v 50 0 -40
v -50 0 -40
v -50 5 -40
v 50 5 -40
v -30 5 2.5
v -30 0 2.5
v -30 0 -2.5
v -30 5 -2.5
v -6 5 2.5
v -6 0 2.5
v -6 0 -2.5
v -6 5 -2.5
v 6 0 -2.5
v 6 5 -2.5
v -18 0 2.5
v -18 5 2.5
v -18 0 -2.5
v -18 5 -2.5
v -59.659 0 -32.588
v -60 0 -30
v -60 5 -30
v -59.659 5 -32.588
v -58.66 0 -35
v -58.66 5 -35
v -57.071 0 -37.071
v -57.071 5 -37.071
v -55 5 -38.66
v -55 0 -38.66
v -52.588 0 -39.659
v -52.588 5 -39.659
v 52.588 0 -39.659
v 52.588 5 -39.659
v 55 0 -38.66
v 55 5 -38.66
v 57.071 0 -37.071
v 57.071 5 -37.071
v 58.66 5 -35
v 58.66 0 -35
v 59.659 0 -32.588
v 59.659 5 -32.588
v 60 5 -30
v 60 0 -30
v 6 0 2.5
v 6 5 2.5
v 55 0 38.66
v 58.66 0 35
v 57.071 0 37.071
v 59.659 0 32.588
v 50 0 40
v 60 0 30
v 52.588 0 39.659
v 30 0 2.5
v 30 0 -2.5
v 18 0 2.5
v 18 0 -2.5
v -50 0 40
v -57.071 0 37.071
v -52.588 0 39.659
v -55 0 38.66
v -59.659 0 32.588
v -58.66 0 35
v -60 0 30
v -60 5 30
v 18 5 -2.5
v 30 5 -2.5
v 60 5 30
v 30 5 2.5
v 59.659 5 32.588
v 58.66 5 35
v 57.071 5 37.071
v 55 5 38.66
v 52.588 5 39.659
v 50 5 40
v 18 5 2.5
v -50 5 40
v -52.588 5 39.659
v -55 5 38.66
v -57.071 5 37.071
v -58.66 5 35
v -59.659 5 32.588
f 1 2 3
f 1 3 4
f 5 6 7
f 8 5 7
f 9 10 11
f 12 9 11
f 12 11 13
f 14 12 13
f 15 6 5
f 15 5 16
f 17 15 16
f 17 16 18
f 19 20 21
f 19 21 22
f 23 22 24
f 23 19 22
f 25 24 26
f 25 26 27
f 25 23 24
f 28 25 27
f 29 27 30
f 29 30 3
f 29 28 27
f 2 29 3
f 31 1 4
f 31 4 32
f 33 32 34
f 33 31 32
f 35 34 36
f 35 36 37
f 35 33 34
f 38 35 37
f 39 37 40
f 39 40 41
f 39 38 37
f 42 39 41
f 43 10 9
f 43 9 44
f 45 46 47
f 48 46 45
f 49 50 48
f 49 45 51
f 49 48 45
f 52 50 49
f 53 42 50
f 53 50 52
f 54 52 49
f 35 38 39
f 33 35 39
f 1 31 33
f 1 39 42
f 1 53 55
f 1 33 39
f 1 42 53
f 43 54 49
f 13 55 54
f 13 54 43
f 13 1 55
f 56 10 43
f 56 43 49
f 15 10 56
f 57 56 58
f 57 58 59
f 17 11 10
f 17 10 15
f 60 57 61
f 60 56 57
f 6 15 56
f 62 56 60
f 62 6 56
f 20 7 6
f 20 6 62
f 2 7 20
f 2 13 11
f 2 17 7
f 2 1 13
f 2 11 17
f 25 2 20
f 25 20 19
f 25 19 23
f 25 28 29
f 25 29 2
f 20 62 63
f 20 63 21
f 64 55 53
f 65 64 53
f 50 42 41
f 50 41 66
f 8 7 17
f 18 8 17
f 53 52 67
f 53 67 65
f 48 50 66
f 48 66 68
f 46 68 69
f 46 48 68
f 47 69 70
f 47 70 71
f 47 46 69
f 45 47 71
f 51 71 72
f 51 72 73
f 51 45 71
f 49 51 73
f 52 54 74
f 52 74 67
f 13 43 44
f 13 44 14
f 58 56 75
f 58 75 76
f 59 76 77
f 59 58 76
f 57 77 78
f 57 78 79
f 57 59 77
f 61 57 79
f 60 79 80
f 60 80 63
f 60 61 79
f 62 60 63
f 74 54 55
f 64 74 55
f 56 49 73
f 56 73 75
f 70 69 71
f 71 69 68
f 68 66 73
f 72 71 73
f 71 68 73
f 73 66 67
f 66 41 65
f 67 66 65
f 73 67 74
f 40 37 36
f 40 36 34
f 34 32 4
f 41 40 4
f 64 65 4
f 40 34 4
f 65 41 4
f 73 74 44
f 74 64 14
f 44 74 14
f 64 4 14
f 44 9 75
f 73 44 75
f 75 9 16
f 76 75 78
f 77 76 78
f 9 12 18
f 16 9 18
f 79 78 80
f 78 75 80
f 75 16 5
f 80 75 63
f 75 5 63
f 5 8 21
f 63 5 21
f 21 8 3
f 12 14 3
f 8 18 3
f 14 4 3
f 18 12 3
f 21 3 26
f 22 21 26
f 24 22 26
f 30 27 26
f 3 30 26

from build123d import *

# Parameters (mm, degrees)
SKETCH1_W           = 12
SKETCH1_H           = 5
BOSS_EXTRUDE1_DEPTH = 5


with BuildPart() as part:
    # Sketch1 → Boss-Extrude1 (new body)
    with BuildSketch(Plane(origin=(0, 0, 0), x_dir=(1, 0, 0), z_dir=(0, 1, 0))):
        with BuildLine():
            Line((-50, 40), (50, 40))
            ThreePointArc((50, 40), (57.071067812, 37.071067812), (60, 30))
            Line((60, 30), (60, -30))
            ThreePointArc((60, -30), (57.071067812, -37.071067812), (50, -40))
            Line((50, -40), (-50, -40))
            ThreePointArc((-50, -40), (-57.071067812, -37.071067812), (-60, -30))
            Line((-60, -30), (-60, 30))
            ThreePointArc((-60, 30), (-57.071067812, 37.071067812), (-50, 40))
        make_face()
        with Locations((-24, 0)):
            Rectangle(SKETCH1_W, SKETCH1_H, mode=Mode.SUBTRACT)
        with Locations((24, 0)):
            Rectangle(SKETCH1_W, SKETCH1_H, mode=Mode.SUBTRACT)
        Rectangle(SKETCH1_W, SKETCH1_H, mode=Mode.SUBTRACT)
    extrude(amount=BOSS_EXTRUDE1_DEPTH)


solid = part.part
